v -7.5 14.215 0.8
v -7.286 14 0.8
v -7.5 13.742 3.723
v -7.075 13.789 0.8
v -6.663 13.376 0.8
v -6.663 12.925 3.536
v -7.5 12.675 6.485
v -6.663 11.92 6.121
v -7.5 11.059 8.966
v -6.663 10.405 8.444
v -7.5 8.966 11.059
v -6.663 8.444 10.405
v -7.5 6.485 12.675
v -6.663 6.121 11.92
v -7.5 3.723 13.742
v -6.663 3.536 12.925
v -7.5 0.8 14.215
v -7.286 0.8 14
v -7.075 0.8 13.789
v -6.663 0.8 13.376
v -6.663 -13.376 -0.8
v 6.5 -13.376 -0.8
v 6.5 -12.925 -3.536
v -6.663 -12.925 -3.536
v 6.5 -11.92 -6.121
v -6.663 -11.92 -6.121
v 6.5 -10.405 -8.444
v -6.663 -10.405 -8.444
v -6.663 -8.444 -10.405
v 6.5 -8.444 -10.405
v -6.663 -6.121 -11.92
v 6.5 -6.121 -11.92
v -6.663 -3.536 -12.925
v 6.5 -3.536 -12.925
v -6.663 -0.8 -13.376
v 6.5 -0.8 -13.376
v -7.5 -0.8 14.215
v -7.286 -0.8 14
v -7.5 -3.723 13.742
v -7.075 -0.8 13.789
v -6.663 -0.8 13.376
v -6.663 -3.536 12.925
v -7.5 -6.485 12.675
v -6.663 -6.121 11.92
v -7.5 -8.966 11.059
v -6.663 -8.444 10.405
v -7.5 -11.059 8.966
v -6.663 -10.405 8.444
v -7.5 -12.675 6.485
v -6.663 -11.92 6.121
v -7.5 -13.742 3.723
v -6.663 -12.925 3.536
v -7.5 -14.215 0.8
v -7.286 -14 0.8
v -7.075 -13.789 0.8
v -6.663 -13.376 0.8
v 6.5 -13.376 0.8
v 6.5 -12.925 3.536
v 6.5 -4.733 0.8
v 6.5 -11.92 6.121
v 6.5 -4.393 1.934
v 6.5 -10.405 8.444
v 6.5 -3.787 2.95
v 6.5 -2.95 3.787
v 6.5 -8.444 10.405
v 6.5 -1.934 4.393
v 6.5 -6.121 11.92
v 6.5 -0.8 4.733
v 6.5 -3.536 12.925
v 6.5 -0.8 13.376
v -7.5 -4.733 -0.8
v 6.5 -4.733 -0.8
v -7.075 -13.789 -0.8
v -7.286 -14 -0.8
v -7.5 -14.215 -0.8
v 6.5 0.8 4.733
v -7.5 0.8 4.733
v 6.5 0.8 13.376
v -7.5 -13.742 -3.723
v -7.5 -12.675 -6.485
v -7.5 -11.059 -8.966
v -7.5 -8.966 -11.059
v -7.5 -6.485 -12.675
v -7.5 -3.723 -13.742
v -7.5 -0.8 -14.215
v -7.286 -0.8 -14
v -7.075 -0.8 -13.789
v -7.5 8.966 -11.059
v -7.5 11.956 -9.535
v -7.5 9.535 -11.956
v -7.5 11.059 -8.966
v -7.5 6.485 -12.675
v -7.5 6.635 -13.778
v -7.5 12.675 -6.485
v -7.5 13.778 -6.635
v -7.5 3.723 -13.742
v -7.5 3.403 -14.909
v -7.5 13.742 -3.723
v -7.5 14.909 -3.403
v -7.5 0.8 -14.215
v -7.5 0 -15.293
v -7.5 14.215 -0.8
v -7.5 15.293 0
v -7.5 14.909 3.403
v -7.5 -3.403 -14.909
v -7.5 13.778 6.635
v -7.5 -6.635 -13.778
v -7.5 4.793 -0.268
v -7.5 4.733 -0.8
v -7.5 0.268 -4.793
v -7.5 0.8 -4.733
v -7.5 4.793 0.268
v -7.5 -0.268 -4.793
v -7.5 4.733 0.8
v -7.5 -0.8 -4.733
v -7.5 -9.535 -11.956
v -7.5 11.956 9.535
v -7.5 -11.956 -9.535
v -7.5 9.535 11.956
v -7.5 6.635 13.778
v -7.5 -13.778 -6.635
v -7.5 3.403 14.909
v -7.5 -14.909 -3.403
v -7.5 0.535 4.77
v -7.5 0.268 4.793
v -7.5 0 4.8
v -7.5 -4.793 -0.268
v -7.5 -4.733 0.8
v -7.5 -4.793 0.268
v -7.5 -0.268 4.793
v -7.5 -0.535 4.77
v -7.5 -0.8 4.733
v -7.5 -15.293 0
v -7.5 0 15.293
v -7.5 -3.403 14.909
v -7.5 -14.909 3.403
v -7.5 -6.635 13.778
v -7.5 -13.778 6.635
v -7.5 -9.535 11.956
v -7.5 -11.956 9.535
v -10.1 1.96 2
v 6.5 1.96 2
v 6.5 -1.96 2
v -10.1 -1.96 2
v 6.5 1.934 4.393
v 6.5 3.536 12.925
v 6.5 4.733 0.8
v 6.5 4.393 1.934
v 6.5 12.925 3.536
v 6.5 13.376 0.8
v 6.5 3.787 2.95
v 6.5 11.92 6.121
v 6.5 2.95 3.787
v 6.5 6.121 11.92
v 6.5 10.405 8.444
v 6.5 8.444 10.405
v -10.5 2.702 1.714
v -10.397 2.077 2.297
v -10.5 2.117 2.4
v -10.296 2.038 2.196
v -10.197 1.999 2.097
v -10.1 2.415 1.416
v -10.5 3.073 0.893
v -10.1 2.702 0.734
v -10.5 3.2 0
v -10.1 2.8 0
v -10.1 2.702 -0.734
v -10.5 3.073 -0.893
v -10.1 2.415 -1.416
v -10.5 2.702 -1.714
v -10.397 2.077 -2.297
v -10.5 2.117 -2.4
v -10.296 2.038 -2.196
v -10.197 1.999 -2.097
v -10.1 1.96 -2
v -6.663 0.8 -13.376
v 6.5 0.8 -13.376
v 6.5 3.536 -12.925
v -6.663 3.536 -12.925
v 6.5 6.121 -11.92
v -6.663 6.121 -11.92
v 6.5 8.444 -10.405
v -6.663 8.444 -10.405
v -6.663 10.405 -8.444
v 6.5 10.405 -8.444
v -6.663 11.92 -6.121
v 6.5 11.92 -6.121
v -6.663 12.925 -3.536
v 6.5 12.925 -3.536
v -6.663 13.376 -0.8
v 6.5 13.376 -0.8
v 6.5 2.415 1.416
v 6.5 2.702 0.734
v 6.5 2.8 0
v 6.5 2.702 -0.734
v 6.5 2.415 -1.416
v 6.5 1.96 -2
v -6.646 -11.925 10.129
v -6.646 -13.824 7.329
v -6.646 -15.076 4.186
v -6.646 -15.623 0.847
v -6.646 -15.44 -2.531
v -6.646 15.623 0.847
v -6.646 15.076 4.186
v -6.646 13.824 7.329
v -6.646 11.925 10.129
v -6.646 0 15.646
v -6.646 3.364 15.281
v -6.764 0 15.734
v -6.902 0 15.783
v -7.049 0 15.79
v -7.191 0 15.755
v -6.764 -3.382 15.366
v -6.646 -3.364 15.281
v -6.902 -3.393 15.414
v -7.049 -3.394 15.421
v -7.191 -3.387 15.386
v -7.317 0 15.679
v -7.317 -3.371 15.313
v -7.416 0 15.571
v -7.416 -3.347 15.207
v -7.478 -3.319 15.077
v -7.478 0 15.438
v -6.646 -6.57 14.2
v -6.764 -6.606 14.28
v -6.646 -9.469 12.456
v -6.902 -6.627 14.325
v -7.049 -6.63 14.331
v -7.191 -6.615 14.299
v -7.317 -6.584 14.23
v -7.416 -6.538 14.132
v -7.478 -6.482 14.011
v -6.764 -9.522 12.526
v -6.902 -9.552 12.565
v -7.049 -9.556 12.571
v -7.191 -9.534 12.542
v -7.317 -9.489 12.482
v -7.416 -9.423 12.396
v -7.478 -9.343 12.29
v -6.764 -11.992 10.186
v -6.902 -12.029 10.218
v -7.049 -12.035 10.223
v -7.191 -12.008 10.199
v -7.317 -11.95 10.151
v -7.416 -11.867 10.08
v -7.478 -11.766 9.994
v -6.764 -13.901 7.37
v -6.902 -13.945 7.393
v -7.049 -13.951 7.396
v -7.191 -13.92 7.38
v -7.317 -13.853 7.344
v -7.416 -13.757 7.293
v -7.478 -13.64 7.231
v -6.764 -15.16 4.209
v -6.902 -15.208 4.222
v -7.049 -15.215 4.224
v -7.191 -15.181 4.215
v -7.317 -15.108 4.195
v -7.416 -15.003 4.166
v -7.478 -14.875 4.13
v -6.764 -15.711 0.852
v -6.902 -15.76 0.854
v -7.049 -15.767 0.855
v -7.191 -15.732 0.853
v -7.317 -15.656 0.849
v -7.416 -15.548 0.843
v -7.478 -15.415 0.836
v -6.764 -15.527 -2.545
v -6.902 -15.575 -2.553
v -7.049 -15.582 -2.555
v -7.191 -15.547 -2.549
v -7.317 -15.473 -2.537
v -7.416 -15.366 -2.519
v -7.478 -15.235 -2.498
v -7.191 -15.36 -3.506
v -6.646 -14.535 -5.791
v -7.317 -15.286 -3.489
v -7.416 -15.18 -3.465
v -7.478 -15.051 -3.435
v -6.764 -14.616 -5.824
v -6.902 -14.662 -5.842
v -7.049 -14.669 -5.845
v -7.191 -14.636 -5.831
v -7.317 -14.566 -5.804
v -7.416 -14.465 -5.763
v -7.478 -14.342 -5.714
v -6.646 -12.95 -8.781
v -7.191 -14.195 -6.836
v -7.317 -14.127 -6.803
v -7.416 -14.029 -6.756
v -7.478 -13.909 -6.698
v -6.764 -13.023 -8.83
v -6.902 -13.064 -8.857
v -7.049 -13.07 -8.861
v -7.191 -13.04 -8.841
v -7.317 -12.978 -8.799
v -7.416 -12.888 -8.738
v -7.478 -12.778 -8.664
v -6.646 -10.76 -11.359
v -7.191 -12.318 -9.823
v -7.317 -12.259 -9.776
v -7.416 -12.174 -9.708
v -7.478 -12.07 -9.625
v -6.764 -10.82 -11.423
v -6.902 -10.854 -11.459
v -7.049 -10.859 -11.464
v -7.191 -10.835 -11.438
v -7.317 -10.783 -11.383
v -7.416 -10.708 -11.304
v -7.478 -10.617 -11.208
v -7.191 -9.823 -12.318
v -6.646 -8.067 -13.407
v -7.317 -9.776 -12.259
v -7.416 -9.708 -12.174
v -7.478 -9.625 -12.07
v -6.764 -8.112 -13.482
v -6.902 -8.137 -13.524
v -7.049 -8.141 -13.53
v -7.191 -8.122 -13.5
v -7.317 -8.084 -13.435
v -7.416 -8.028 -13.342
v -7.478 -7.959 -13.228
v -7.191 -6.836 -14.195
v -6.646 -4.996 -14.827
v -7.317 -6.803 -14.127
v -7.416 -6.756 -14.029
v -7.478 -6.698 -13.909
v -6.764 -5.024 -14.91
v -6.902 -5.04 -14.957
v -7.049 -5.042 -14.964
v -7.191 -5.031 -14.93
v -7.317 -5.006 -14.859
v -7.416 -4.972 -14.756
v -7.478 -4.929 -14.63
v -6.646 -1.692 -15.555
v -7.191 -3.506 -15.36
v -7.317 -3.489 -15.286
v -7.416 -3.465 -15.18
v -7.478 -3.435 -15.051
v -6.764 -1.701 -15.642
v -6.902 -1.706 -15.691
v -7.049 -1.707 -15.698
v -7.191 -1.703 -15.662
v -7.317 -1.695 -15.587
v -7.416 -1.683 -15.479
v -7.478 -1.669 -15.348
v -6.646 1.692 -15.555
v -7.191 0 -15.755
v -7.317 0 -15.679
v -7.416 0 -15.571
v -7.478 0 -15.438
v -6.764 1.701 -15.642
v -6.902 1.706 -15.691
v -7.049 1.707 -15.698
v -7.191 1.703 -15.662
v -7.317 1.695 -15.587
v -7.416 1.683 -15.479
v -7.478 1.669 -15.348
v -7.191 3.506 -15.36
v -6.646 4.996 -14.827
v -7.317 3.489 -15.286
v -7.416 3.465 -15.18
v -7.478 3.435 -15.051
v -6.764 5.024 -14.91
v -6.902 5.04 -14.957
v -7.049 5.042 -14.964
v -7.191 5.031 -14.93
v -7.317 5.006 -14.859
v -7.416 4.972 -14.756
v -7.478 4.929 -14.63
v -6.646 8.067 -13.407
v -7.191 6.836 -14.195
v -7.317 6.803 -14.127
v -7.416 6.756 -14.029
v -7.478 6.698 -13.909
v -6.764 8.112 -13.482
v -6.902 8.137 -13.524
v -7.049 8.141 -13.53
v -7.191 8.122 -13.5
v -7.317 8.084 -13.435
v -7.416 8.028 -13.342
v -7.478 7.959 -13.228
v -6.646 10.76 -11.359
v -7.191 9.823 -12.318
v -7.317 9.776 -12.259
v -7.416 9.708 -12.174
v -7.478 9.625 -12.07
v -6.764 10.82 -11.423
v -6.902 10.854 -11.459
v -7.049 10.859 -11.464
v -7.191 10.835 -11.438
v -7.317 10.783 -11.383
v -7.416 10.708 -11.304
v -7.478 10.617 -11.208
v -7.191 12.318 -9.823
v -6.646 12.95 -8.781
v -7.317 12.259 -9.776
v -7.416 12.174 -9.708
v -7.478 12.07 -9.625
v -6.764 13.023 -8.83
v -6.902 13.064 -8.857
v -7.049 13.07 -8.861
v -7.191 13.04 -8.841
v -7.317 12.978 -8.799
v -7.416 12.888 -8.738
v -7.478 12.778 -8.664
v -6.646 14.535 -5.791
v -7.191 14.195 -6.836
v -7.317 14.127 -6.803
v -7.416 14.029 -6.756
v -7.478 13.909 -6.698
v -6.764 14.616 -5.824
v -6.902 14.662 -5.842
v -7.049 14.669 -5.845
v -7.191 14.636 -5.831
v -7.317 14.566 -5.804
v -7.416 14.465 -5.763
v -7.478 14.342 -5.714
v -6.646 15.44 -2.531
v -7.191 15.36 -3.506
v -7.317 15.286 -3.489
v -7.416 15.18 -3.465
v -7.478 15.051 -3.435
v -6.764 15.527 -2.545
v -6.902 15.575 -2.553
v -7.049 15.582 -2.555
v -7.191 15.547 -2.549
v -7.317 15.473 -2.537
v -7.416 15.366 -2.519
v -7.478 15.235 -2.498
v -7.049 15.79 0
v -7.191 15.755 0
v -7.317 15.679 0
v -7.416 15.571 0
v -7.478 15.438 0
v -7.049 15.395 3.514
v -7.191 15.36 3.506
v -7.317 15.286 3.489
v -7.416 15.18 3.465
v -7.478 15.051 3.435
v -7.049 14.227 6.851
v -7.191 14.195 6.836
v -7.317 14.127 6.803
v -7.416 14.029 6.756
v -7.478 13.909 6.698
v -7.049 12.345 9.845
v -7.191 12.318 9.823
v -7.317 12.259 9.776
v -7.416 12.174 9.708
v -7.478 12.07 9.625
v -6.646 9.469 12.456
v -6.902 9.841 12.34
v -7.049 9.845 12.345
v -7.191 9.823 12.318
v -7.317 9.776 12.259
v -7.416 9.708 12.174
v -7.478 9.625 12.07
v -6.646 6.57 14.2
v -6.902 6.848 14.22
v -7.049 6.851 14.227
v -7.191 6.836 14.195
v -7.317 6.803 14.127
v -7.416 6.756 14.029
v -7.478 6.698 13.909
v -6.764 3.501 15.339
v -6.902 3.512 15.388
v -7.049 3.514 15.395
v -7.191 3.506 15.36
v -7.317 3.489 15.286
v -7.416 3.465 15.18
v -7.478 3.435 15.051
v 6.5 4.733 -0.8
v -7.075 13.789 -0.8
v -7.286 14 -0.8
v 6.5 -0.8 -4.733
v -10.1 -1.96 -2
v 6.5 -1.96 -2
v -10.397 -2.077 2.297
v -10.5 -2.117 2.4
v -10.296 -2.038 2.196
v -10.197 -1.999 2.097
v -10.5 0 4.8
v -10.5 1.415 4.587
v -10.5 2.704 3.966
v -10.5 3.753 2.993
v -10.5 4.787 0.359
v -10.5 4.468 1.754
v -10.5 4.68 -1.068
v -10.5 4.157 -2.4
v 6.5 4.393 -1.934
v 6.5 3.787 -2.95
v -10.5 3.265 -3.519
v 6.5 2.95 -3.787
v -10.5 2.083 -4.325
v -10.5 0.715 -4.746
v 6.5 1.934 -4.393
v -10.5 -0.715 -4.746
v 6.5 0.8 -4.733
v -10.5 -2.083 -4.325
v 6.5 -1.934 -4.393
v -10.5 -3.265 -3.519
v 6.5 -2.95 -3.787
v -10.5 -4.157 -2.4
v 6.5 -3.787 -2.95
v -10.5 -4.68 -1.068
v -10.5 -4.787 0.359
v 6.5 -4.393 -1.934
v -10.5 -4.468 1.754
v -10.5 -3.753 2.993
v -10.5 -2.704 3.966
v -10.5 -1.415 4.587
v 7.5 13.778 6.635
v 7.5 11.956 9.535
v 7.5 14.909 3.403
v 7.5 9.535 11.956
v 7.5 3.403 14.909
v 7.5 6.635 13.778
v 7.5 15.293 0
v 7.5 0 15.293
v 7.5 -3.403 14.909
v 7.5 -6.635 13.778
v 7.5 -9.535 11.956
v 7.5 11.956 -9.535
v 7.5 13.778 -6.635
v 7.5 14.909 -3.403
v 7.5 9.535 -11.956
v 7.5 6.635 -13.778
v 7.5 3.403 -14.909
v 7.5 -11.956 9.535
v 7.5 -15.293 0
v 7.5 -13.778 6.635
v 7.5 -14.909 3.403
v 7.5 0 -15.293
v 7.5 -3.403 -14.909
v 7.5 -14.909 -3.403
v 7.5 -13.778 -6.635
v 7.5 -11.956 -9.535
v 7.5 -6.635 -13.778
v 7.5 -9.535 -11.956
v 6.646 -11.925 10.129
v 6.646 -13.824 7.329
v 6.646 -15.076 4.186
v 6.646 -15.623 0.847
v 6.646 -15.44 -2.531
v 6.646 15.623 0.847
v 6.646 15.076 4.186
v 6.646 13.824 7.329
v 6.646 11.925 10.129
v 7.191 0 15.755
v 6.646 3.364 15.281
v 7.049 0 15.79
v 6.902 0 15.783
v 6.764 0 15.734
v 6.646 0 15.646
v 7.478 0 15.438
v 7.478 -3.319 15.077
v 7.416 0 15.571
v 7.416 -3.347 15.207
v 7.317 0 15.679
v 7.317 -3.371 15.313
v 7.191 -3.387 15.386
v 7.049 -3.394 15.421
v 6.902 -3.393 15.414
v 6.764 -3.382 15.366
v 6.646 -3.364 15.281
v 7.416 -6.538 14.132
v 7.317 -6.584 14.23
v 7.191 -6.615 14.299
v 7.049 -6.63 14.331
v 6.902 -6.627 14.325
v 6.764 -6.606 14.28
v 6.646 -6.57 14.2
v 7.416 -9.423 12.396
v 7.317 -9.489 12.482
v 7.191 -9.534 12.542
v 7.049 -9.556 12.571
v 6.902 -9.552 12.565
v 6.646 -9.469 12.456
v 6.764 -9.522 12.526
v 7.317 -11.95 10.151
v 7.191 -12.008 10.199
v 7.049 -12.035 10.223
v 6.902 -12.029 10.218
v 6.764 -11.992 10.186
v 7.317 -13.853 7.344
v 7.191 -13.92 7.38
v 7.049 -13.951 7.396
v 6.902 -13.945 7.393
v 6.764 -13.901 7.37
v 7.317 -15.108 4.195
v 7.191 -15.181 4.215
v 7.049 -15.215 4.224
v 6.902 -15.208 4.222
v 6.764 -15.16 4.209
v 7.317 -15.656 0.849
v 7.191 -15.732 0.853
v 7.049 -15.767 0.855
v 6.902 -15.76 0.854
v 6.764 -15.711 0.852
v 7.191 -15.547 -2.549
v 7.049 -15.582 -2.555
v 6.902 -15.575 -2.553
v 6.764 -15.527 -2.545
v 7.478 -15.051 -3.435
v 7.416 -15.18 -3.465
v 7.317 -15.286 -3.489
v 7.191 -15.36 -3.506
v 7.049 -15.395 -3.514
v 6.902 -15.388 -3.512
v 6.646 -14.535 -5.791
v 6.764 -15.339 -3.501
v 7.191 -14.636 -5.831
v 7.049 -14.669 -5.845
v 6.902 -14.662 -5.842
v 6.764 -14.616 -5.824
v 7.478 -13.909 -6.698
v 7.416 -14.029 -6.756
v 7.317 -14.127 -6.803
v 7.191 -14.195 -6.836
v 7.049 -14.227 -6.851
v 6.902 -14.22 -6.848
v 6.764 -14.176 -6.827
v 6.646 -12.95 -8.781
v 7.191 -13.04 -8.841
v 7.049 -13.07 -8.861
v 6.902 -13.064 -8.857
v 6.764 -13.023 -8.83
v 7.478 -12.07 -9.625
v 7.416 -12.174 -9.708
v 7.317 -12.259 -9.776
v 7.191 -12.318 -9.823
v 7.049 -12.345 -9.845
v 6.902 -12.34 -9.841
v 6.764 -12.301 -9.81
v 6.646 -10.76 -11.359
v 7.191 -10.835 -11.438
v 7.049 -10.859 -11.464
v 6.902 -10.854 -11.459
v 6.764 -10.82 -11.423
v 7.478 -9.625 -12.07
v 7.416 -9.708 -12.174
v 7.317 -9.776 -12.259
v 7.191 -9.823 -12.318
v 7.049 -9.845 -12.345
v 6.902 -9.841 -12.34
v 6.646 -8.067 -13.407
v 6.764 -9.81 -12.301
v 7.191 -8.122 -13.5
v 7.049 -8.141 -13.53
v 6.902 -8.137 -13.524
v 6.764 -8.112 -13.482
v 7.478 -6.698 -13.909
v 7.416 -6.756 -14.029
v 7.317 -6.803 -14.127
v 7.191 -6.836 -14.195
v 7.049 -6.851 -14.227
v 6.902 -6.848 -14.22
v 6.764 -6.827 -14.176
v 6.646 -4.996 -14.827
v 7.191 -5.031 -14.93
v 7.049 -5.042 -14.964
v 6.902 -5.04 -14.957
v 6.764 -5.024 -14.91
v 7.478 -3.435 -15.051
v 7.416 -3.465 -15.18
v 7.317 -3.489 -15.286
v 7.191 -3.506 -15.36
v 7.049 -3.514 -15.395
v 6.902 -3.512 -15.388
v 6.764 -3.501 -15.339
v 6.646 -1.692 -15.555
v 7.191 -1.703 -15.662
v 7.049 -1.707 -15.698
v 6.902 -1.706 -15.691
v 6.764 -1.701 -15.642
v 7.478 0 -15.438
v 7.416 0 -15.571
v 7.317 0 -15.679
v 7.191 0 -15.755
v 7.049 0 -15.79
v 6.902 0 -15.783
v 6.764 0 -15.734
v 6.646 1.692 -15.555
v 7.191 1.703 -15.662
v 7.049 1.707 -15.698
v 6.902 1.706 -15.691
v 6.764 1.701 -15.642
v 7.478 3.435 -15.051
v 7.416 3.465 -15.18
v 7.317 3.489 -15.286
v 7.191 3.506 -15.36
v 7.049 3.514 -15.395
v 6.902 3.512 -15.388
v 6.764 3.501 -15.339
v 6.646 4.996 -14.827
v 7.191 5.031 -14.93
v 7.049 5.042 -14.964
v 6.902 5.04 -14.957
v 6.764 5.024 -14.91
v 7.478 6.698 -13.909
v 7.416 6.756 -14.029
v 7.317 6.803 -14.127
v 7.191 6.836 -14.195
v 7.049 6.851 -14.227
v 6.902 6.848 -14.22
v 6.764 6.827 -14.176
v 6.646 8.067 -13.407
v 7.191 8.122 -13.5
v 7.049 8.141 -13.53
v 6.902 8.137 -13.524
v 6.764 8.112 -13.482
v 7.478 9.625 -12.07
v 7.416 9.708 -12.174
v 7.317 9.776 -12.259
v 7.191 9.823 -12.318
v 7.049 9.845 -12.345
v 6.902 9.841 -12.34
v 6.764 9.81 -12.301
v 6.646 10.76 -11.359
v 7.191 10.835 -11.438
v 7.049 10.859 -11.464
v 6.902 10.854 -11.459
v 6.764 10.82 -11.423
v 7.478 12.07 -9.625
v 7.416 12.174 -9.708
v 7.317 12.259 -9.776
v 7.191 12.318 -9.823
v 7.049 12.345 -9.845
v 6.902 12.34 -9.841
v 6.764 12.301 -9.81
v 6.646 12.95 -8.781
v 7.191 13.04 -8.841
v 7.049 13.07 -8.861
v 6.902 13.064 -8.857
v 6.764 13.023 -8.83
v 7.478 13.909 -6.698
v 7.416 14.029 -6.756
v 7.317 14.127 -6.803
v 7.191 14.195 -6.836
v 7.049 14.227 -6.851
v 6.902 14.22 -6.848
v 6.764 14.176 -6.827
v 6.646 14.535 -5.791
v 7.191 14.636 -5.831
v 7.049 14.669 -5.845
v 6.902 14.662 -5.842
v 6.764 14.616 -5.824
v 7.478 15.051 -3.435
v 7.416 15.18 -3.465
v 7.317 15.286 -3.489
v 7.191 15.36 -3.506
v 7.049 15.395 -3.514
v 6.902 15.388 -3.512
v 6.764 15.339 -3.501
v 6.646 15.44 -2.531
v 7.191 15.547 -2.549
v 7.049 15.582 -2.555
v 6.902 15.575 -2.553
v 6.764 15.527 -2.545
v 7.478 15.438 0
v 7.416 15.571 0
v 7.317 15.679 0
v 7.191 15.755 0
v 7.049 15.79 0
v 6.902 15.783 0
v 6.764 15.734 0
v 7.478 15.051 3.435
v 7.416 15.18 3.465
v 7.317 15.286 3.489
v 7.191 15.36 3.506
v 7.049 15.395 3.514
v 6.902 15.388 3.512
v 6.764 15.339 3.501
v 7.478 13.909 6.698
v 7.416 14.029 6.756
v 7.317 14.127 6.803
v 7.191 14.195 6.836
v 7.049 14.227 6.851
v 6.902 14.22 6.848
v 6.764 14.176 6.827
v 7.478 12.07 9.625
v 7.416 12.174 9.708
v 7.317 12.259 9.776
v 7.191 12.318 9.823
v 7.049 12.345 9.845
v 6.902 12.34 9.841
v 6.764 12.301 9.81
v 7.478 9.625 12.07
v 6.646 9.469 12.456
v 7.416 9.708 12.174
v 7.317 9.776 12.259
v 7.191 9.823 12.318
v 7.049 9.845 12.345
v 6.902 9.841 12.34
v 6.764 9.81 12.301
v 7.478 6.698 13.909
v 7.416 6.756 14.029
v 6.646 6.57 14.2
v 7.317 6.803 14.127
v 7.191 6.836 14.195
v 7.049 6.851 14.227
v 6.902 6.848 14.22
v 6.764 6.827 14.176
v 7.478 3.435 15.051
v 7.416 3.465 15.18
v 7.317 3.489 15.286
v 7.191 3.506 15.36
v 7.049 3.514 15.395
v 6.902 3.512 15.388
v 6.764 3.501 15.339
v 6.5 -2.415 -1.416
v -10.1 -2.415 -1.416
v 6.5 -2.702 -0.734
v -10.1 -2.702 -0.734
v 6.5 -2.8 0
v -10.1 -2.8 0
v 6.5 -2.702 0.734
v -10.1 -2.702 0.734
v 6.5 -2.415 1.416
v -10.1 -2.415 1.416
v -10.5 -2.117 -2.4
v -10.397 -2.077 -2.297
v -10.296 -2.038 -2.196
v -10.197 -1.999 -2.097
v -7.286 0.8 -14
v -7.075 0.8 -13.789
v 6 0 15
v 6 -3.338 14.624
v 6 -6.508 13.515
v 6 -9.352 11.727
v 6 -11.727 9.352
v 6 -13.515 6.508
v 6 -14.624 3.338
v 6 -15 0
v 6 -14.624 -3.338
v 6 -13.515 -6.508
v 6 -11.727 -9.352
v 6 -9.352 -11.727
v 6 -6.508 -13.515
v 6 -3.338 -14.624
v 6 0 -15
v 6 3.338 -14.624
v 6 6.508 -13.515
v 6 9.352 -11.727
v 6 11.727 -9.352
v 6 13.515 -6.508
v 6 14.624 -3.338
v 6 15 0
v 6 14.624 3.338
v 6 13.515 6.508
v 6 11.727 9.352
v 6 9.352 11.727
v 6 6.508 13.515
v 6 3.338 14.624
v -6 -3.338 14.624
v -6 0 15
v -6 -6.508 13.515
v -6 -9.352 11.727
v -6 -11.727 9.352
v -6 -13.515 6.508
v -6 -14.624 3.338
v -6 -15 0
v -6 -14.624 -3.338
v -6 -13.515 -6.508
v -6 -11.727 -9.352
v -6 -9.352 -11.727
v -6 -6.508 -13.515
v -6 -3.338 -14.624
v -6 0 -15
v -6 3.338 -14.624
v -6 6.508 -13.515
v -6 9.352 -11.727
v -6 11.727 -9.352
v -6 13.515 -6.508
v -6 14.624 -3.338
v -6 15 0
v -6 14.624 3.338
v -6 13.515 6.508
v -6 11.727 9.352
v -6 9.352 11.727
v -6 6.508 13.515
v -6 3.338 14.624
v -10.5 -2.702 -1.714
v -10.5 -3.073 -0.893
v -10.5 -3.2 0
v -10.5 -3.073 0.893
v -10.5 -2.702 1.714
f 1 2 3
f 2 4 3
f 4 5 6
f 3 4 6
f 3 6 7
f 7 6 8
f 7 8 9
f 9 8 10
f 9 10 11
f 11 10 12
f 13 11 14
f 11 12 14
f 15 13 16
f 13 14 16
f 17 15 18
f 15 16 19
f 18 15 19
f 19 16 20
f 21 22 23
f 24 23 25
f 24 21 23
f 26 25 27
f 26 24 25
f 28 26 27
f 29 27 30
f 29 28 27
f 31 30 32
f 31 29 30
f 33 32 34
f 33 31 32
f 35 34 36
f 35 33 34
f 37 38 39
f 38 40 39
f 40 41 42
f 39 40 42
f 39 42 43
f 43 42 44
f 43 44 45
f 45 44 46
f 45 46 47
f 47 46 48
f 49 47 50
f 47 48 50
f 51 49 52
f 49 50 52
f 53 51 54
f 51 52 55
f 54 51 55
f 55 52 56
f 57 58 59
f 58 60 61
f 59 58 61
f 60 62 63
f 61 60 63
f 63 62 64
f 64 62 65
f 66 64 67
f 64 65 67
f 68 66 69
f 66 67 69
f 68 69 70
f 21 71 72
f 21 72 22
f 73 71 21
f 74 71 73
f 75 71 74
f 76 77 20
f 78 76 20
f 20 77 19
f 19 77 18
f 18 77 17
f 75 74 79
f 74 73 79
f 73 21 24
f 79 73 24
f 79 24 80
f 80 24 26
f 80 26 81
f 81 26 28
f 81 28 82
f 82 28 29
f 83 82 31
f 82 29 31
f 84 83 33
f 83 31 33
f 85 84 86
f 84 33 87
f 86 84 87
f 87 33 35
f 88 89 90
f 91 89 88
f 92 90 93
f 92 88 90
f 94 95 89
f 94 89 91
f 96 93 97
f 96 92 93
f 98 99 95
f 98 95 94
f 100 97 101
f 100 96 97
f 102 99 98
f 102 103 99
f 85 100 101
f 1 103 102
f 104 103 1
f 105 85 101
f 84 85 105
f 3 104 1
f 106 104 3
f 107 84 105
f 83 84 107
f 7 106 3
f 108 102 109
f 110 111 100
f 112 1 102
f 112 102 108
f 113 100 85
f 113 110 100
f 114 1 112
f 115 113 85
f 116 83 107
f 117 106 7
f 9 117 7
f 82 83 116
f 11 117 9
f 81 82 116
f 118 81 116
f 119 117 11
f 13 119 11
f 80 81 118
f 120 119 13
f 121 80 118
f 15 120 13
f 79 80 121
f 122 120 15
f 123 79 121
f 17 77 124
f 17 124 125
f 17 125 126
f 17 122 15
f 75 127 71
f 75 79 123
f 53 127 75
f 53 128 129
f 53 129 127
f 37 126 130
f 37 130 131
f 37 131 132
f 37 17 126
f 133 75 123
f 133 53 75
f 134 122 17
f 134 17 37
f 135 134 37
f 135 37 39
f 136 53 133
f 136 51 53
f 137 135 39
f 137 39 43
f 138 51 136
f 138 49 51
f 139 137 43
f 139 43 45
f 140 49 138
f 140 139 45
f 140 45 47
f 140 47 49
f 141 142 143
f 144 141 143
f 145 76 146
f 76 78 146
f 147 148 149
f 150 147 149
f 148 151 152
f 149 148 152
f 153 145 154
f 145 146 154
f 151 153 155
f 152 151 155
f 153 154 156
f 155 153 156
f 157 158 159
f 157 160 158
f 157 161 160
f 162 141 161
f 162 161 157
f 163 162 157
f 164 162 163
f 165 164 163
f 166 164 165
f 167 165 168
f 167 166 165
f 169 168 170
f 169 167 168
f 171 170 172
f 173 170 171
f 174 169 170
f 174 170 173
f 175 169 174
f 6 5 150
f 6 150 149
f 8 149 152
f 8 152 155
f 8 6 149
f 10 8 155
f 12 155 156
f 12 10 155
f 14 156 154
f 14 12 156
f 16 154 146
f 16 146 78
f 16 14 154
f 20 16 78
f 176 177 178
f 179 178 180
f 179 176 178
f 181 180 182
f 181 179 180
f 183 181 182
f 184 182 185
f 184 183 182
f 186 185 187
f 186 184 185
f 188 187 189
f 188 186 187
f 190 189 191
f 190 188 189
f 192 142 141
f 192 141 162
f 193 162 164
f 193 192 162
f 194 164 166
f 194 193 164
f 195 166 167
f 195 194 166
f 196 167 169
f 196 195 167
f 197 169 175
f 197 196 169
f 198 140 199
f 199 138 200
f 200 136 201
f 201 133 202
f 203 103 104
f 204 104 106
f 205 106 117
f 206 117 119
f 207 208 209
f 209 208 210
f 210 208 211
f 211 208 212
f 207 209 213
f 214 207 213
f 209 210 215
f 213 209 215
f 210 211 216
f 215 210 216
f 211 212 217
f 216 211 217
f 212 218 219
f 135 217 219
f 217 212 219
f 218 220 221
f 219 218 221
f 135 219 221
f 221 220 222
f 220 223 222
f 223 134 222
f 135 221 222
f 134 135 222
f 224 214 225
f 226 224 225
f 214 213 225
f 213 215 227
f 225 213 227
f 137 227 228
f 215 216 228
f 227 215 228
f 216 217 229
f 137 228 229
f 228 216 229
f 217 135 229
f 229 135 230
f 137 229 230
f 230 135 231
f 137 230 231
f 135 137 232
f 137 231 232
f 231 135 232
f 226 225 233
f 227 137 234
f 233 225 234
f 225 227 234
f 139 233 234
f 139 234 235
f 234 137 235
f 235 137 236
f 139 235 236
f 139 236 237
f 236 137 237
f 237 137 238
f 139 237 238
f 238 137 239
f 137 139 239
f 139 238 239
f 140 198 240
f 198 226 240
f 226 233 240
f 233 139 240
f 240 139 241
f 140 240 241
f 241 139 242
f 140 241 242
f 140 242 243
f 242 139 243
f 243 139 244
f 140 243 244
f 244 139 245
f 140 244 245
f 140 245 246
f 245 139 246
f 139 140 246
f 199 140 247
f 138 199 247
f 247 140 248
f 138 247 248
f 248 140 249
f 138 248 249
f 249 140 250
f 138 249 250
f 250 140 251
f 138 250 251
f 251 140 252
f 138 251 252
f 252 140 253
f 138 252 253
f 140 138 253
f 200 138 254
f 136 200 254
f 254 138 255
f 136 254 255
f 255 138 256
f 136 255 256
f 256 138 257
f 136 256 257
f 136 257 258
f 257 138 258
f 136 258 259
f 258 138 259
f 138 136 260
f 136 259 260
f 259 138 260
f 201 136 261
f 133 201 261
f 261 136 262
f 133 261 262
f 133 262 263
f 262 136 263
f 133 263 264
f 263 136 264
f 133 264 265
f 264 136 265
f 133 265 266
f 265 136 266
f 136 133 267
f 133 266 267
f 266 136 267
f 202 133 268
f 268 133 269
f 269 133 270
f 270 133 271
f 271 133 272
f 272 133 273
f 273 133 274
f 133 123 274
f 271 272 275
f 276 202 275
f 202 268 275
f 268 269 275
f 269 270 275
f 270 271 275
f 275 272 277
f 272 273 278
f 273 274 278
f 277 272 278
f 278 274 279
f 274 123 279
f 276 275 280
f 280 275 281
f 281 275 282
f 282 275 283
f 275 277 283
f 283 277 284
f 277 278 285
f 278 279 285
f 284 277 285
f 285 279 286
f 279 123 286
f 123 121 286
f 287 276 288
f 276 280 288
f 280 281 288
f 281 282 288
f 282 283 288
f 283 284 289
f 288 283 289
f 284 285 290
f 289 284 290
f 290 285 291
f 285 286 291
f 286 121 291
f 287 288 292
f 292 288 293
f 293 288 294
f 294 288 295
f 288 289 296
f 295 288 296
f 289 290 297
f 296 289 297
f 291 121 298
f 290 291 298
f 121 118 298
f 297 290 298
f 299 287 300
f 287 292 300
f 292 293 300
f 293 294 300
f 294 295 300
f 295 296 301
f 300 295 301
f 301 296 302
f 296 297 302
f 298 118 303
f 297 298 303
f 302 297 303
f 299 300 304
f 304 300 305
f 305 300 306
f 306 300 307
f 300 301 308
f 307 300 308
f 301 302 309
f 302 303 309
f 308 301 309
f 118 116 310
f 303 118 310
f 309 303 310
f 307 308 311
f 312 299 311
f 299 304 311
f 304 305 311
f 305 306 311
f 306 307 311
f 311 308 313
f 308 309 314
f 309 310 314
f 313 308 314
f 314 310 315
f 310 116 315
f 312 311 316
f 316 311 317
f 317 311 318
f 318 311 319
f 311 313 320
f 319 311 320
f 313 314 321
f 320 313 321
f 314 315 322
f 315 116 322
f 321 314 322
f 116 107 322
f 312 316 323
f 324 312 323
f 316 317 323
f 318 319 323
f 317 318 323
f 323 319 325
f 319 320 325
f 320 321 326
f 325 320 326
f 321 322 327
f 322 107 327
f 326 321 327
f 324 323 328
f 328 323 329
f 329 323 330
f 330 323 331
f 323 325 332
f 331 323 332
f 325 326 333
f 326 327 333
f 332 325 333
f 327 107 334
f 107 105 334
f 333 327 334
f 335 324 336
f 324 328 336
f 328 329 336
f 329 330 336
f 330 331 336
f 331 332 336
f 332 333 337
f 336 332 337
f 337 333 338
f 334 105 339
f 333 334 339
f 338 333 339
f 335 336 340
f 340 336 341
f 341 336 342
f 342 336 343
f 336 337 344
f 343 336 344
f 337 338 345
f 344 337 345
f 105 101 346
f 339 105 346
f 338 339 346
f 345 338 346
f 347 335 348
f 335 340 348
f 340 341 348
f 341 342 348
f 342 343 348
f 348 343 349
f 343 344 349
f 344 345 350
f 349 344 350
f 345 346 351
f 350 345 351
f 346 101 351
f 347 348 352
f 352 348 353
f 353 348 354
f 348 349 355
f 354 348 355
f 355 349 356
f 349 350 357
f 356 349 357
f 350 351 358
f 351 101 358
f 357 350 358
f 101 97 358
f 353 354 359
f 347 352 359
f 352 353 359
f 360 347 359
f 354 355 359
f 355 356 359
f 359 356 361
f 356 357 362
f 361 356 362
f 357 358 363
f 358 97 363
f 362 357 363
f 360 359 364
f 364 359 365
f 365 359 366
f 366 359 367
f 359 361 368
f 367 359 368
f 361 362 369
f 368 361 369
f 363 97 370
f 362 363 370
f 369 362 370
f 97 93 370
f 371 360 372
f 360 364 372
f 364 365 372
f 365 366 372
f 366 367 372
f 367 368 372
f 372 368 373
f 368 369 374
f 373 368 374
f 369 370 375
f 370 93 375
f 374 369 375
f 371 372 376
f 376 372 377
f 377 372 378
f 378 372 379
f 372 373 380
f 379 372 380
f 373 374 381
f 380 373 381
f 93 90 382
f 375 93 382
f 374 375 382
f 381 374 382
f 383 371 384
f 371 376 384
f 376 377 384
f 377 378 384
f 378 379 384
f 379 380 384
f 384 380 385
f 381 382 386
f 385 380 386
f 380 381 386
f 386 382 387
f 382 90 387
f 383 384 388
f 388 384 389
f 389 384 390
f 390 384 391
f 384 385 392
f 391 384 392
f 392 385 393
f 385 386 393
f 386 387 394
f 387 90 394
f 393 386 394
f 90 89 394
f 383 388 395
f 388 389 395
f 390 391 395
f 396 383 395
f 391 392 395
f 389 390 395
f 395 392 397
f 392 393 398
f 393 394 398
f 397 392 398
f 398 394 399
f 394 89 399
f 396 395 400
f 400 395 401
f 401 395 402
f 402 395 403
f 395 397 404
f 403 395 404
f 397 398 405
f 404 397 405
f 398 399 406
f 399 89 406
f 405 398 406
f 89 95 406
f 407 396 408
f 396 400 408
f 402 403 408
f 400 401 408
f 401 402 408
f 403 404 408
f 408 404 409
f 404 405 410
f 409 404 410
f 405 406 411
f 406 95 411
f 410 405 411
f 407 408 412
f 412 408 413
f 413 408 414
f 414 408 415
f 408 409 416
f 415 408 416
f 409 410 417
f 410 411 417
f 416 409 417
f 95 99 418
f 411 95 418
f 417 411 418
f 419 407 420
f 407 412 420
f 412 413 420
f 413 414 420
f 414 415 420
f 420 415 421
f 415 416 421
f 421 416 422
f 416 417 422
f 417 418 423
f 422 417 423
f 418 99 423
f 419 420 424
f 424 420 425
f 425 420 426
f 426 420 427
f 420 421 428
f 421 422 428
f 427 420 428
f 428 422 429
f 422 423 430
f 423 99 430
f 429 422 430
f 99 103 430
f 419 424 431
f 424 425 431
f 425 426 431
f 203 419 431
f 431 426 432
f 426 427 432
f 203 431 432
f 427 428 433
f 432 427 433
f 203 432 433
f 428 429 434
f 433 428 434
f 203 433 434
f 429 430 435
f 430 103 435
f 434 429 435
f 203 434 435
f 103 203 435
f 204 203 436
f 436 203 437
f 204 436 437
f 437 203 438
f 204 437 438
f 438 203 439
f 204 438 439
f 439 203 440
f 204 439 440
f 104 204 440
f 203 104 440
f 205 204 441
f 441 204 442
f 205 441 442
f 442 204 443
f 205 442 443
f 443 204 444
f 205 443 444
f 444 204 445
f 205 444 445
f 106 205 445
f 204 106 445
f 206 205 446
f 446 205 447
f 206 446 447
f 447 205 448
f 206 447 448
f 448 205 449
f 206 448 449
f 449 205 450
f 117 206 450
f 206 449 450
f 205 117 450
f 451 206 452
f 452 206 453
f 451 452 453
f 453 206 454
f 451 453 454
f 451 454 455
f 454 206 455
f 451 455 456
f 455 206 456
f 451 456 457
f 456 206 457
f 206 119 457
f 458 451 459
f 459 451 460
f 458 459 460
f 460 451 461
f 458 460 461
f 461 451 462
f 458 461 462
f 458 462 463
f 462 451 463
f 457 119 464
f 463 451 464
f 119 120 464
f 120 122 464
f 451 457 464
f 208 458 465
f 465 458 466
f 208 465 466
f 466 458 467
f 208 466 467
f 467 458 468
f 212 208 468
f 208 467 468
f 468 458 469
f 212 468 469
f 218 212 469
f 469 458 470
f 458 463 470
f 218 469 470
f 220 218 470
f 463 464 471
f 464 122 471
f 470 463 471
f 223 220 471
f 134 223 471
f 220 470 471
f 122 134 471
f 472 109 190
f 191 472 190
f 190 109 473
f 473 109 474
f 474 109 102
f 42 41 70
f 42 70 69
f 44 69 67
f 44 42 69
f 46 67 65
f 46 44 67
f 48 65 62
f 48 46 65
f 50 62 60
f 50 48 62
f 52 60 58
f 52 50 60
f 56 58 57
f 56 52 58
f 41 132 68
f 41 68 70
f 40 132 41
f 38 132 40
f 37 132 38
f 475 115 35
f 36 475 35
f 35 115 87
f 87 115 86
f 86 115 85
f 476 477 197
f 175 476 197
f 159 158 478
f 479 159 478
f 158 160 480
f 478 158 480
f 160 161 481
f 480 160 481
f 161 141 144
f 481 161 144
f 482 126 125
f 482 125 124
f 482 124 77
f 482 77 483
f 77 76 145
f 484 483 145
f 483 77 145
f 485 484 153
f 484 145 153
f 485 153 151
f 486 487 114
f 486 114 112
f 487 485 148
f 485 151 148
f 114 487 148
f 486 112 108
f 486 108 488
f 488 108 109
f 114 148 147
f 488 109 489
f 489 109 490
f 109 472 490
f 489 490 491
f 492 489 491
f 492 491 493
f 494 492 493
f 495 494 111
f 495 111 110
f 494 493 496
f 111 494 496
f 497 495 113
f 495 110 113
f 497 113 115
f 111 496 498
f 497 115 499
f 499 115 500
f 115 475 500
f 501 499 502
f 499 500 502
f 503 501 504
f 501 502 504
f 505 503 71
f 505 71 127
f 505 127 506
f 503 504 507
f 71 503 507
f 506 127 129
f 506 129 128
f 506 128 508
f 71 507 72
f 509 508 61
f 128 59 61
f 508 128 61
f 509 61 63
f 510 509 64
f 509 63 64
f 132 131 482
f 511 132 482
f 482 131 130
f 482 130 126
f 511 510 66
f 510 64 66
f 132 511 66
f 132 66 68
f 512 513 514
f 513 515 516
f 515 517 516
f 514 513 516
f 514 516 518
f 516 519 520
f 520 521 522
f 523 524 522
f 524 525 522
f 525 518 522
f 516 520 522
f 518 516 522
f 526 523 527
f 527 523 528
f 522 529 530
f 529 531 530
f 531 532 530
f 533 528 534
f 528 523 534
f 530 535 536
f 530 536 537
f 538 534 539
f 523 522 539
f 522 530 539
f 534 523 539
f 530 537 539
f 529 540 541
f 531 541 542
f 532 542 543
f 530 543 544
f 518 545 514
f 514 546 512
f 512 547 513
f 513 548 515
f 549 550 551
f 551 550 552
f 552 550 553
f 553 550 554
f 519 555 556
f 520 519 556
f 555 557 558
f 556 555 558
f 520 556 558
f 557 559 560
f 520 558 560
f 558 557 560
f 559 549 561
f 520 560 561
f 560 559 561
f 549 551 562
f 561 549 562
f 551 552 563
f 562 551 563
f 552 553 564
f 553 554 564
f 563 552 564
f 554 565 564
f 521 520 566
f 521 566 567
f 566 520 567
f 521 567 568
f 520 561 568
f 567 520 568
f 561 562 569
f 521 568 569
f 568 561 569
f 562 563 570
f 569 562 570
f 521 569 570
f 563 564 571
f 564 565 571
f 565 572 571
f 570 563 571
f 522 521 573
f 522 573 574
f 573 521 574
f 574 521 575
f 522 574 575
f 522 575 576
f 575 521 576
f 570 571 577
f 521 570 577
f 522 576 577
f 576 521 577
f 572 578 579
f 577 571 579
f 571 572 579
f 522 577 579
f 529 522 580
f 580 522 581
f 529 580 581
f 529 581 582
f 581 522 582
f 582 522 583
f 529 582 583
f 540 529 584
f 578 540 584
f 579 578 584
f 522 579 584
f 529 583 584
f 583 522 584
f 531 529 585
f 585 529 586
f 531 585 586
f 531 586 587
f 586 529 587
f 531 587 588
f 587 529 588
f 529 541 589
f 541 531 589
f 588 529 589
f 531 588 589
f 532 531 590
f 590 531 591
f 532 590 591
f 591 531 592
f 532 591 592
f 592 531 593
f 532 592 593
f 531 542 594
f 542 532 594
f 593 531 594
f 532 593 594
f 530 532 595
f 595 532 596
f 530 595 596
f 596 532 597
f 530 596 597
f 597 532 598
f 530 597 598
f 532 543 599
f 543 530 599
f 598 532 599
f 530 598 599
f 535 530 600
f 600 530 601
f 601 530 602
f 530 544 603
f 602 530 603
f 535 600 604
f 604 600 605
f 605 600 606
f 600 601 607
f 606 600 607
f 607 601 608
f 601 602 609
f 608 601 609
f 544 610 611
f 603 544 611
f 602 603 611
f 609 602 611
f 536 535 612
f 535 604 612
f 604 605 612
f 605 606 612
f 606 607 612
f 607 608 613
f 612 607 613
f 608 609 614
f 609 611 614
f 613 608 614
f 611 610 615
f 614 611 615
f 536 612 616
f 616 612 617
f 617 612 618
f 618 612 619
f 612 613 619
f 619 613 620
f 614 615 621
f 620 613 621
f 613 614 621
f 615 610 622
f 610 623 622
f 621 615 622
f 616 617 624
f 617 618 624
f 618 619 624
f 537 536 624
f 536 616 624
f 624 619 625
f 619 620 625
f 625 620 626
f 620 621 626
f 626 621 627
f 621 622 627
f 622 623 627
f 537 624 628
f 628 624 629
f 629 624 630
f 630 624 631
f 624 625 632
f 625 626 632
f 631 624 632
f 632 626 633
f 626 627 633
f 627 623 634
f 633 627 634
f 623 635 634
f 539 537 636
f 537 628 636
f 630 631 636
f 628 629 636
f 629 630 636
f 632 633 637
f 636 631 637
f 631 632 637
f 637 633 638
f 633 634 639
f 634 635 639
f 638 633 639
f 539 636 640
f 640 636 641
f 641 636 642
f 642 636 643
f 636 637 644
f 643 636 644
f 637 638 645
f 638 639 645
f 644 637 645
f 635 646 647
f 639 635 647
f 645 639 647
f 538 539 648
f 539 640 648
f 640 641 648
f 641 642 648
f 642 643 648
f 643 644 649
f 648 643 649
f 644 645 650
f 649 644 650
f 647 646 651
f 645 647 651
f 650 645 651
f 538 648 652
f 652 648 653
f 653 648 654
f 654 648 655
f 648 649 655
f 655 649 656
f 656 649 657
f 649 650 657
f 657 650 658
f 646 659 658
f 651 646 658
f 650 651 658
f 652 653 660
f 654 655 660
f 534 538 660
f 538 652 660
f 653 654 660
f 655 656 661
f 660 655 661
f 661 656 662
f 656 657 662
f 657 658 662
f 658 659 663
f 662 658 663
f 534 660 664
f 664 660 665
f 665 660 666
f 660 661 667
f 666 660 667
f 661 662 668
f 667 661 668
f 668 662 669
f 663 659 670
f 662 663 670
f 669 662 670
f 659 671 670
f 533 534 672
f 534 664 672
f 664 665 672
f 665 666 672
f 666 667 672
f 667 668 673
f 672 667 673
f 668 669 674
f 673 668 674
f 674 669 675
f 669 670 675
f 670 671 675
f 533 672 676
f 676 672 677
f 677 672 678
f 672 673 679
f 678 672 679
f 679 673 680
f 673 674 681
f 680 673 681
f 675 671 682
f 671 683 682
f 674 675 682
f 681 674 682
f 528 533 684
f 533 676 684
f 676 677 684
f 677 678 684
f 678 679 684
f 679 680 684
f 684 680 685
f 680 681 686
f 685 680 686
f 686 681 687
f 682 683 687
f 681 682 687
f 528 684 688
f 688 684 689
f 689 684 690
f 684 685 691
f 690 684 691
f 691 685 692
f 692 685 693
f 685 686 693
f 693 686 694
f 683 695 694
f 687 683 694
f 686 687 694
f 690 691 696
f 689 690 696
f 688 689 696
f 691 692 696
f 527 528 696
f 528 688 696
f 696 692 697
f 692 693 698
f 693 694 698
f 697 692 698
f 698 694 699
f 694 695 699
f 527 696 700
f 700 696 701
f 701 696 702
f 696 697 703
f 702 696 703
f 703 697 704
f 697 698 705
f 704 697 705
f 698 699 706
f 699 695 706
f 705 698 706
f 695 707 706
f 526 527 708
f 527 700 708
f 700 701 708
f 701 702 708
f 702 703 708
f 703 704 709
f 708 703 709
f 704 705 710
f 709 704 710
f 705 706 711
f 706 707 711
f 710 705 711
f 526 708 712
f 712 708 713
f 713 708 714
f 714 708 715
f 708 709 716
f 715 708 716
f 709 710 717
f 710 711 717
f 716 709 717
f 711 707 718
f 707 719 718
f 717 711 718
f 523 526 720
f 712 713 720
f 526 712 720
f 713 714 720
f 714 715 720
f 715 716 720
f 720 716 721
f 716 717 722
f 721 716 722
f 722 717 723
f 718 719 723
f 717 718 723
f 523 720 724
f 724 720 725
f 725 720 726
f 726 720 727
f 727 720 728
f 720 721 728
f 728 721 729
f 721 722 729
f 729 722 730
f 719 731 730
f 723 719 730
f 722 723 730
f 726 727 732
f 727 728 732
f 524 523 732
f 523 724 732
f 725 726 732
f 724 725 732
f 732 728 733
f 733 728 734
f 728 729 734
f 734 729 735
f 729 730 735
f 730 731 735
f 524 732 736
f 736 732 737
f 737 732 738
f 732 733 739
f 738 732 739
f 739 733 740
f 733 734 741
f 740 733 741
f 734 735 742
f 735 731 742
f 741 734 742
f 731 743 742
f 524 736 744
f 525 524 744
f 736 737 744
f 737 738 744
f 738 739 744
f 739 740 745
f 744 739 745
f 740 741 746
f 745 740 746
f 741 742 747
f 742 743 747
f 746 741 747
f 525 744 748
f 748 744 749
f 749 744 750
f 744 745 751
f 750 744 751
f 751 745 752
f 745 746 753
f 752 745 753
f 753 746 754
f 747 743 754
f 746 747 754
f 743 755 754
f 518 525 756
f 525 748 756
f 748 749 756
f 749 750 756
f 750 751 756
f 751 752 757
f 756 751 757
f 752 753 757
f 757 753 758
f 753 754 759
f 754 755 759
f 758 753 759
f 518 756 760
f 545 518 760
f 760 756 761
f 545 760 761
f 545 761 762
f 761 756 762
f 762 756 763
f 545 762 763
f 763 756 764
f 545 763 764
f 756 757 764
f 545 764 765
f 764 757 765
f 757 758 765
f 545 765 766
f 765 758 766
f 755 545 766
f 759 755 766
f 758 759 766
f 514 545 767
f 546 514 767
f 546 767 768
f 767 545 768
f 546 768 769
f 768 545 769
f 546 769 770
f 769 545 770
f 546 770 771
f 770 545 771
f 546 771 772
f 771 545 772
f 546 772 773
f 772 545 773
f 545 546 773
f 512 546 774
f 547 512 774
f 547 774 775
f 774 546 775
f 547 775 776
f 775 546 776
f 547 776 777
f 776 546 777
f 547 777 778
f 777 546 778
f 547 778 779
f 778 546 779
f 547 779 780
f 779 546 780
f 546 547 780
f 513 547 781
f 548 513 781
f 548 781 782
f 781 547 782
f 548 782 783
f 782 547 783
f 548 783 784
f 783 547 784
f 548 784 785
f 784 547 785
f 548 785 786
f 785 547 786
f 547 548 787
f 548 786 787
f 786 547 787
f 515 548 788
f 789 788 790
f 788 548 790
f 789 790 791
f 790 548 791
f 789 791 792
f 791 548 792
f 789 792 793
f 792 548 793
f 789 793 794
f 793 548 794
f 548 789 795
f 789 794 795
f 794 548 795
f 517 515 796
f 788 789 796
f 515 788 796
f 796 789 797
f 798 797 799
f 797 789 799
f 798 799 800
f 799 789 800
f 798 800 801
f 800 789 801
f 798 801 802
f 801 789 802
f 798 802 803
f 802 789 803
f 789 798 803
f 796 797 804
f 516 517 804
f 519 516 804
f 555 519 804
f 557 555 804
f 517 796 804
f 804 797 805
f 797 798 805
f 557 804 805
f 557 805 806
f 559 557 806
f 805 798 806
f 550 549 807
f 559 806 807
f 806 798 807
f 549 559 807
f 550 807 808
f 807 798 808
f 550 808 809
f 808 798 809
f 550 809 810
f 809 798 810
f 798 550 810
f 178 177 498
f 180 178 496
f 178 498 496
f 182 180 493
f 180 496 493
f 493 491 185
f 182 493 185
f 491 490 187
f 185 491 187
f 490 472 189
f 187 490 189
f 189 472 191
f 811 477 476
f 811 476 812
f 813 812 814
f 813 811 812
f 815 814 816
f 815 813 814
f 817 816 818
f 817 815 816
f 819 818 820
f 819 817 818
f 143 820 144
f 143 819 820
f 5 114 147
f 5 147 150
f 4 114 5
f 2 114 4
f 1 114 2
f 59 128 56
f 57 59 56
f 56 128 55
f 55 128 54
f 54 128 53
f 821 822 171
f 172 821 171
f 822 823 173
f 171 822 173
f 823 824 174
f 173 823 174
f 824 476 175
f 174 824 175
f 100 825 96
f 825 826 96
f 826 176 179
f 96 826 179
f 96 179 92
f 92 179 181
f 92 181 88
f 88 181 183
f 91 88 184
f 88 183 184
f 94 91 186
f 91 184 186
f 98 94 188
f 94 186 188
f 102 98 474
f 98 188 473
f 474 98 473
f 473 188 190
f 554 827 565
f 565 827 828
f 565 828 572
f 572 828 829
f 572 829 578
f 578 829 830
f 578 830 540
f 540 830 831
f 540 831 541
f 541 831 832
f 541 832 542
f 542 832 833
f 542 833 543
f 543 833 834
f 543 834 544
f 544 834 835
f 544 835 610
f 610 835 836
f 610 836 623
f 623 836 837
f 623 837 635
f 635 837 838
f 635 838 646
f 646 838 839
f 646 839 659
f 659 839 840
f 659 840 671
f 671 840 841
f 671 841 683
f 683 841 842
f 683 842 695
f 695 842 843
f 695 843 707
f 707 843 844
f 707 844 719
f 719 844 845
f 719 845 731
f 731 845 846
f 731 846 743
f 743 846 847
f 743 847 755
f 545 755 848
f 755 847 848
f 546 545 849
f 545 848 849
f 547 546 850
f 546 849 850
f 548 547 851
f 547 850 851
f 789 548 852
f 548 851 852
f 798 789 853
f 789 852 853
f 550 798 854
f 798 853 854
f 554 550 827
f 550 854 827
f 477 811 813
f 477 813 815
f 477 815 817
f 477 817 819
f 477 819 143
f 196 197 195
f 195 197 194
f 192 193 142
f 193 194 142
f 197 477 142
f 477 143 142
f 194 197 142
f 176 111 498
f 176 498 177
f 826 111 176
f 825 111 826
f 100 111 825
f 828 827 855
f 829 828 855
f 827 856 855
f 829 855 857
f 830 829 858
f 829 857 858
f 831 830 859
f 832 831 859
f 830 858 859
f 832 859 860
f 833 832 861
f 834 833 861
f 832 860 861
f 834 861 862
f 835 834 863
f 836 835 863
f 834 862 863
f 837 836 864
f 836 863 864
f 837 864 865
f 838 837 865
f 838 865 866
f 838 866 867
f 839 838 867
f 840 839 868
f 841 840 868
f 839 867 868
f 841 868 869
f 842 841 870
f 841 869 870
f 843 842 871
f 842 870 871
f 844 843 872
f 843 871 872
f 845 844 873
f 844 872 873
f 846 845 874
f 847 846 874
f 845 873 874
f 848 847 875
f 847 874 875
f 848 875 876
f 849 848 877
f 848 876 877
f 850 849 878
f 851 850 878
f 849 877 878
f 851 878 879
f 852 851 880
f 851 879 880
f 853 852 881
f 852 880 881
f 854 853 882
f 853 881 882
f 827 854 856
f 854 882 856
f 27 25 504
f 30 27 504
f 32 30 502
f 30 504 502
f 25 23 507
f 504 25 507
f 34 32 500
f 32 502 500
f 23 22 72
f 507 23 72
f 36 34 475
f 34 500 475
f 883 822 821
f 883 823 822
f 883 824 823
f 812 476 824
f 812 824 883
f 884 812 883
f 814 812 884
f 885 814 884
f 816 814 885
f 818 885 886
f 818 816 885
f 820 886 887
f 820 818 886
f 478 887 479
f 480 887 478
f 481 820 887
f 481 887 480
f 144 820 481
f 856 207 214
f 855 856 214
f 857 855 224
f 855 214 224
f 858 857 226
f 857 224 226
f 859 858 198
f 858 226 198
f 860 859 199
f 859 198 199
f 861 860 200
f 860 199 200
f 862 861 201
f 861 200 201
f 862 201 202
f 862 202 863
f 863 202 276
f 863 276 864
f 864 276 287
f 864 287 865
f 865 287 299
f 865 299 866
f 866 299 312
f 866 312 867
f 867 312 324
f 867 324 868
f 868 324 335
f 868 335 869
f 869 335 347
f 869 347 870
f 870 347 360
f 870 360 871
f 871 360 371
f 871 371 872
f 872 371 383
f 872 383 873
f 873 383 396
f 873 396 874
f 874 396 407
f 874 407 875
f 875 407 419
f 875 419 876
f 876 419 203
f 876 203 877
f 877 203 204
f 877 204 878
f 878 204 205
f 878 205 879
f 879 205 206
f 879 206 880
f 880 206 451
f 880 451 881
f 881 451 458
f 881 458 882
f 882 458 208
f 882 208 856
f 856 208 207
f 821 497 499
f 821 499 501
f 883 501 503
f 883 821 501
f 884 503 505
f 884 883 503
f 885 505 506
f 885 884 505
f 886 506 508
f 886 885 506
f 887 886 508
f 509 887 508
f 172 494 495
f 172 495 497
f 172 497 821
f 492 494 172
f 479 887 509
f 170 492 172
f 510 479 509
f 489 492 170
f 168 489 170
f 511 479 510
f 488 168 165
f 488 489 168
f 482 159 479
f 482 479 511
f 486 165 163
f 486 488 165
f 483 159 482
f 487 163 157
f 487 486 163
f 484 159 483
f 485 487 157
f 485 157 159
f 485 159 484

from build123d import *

# Parameters (mm, degrees)
REDONDEO2_R             = 0.5
MOVER_CARA1_BY          = 0.6
CROQUIS3_R              = 4.8
CROQUIS3_R_2            = 2.8
SALIENTE_EXTRUIR1_DEPTH = 17
NERVIO4_REACH           = 28.904
CROQUIS5_WALLS_W        = 1.6
CROQUIS5_WALLS_H        = 65.245471754
MATRIZC1_COUNT          = 4
CHAFL_N1_SIZE           = 0.4


# Read off the part's stored shape, not the designer's step: Vaciado1
with BuildPart() as part:
    # Croquis2 → Revolución1 (revolve)
    with BuildSketch(Plane.XY, mode=Mode.PRIVATE) as revoluci_n1_sk:
        Polygon((-7.5, 0), (7.5, 0), (7.5, 16.5), (6, 15), (-6, 15), (-7.5, 16.5), align=None)
    revolve(revoluci_n1_sk.sketch.rotate(Axis((-7.5, 0, 0), (1, 0, 0)), 90), axis=Axis((-7.5, 0, 0), (1, 0, 0)))

    # Vaciado1 outline → Vaciado1 (revolve, cut)
    with BuildSketch(Plane.YX):
        Polygon((13.4, 5.9), (0, 5.9), (0, -7.5), (14.2372583, -7.5), (13.4, -6.6627417), align=None)
    revolve(axis=Axis((0, 0, 0), (1, 0, 0)), mode=Mode.SUBTRACT)

    # Redondeo2
    redondeo2_edges = [part.edges().sort_by_distance(p)[0] for p in [
        (-7.5, 0, -16.5),
        (7.5, 0, -16.5),
    ]]
    fillet(redondeo2_edges, radius=REDONDEO2_R)

    # Mover cara1: a face moved inward by 0.6
    extrude(part.faces().sort_by_distance((5.9, 0, 0))[0], amount=MOVER_CARA1_BY, dir=(1, 0, 0), mode=Mode.SUBTRACT)

    # Croquis3 → Saliente-Extruir1 (add)
    # profile 1 of 3: a face of its own
    with BuildSketch(Plane.ZY.offset(-6.5)):
        Circle(CROQUIS3_R)
        Circle(CROQUIS3_R_2, mode=Mode.SUBTRACT)
    # profile 2 of 3: a face of its own
    with BuildSketch(Plane.ZY.offset(-6.5)):
        with BuildLine():
            ThreePointArc((2.8, 0), (2.592296279, 1.058300524), (2, 1.959591794))
            Line((2, 1.959591794), (2, -1.959591794))
            ThreePointArc((2, -1.959591794), (2.592296279, -1.058300524), (2.8, 0))
        make_face()
    # profile 3 of 3: a face of its own
    with BuildSketch(Plane.ZY.offset(-6.5)):
        with BuildLine():
            Line((-2, -1.959591794), (-2, 1.959591794))
            ThreePointArc((-2, 1.959591794), (-2.8, 0), (-2, -1.959591794))
        make_face()
    extrude(amount=SALIENTE_EXTRUIR1_DEPTH)

    # Croquis5 walls → Nervio4 (add, up to next)
    with BuildSketch(Plane.ZY.offset(7.5), mode=Mode.PRIVATE) as nervio4_sk1:
        with Locations((0, 9.51862915)):
            Rectangle(CROQUIS5_WALLS_W, CROQUIS5_WALLS_H)
    nervio4_tool1 = extrude(nervio4_sk1.sketch, amount=-NERVIO4_REACH, mode=Mode.PRIVATE) - part.part
    nervio4 = nervio4_tool1.solids().sort_by_distance((-7.5, 9.51862915, 0))[0]
    add(nervio4)

    # MatrizC1: Nervio4 ×4 about axis
    matrizc1_axis = Axis((0, 0, 0), (1, 0, 0))
    for i in range(1, MATRIZC1_COUNT):
        add(nervio4.rotate(matrizc1_axis, i * 360 / MATRIZC1_COUNT))

    # Chaflán1
    chafl_n1_edges = [part.edges().sort_by_distance(p)[0] for p in [
        (-10.5, 0, -2),
        (-10.5, 2.8, 0),
        (-10.5, -2.8, 0),
        (-10.5, 0, 2),
    ]]
    chamfer(chafl_n1_edges, length=CHAFL_N1_SIZE)


solid = part.part
